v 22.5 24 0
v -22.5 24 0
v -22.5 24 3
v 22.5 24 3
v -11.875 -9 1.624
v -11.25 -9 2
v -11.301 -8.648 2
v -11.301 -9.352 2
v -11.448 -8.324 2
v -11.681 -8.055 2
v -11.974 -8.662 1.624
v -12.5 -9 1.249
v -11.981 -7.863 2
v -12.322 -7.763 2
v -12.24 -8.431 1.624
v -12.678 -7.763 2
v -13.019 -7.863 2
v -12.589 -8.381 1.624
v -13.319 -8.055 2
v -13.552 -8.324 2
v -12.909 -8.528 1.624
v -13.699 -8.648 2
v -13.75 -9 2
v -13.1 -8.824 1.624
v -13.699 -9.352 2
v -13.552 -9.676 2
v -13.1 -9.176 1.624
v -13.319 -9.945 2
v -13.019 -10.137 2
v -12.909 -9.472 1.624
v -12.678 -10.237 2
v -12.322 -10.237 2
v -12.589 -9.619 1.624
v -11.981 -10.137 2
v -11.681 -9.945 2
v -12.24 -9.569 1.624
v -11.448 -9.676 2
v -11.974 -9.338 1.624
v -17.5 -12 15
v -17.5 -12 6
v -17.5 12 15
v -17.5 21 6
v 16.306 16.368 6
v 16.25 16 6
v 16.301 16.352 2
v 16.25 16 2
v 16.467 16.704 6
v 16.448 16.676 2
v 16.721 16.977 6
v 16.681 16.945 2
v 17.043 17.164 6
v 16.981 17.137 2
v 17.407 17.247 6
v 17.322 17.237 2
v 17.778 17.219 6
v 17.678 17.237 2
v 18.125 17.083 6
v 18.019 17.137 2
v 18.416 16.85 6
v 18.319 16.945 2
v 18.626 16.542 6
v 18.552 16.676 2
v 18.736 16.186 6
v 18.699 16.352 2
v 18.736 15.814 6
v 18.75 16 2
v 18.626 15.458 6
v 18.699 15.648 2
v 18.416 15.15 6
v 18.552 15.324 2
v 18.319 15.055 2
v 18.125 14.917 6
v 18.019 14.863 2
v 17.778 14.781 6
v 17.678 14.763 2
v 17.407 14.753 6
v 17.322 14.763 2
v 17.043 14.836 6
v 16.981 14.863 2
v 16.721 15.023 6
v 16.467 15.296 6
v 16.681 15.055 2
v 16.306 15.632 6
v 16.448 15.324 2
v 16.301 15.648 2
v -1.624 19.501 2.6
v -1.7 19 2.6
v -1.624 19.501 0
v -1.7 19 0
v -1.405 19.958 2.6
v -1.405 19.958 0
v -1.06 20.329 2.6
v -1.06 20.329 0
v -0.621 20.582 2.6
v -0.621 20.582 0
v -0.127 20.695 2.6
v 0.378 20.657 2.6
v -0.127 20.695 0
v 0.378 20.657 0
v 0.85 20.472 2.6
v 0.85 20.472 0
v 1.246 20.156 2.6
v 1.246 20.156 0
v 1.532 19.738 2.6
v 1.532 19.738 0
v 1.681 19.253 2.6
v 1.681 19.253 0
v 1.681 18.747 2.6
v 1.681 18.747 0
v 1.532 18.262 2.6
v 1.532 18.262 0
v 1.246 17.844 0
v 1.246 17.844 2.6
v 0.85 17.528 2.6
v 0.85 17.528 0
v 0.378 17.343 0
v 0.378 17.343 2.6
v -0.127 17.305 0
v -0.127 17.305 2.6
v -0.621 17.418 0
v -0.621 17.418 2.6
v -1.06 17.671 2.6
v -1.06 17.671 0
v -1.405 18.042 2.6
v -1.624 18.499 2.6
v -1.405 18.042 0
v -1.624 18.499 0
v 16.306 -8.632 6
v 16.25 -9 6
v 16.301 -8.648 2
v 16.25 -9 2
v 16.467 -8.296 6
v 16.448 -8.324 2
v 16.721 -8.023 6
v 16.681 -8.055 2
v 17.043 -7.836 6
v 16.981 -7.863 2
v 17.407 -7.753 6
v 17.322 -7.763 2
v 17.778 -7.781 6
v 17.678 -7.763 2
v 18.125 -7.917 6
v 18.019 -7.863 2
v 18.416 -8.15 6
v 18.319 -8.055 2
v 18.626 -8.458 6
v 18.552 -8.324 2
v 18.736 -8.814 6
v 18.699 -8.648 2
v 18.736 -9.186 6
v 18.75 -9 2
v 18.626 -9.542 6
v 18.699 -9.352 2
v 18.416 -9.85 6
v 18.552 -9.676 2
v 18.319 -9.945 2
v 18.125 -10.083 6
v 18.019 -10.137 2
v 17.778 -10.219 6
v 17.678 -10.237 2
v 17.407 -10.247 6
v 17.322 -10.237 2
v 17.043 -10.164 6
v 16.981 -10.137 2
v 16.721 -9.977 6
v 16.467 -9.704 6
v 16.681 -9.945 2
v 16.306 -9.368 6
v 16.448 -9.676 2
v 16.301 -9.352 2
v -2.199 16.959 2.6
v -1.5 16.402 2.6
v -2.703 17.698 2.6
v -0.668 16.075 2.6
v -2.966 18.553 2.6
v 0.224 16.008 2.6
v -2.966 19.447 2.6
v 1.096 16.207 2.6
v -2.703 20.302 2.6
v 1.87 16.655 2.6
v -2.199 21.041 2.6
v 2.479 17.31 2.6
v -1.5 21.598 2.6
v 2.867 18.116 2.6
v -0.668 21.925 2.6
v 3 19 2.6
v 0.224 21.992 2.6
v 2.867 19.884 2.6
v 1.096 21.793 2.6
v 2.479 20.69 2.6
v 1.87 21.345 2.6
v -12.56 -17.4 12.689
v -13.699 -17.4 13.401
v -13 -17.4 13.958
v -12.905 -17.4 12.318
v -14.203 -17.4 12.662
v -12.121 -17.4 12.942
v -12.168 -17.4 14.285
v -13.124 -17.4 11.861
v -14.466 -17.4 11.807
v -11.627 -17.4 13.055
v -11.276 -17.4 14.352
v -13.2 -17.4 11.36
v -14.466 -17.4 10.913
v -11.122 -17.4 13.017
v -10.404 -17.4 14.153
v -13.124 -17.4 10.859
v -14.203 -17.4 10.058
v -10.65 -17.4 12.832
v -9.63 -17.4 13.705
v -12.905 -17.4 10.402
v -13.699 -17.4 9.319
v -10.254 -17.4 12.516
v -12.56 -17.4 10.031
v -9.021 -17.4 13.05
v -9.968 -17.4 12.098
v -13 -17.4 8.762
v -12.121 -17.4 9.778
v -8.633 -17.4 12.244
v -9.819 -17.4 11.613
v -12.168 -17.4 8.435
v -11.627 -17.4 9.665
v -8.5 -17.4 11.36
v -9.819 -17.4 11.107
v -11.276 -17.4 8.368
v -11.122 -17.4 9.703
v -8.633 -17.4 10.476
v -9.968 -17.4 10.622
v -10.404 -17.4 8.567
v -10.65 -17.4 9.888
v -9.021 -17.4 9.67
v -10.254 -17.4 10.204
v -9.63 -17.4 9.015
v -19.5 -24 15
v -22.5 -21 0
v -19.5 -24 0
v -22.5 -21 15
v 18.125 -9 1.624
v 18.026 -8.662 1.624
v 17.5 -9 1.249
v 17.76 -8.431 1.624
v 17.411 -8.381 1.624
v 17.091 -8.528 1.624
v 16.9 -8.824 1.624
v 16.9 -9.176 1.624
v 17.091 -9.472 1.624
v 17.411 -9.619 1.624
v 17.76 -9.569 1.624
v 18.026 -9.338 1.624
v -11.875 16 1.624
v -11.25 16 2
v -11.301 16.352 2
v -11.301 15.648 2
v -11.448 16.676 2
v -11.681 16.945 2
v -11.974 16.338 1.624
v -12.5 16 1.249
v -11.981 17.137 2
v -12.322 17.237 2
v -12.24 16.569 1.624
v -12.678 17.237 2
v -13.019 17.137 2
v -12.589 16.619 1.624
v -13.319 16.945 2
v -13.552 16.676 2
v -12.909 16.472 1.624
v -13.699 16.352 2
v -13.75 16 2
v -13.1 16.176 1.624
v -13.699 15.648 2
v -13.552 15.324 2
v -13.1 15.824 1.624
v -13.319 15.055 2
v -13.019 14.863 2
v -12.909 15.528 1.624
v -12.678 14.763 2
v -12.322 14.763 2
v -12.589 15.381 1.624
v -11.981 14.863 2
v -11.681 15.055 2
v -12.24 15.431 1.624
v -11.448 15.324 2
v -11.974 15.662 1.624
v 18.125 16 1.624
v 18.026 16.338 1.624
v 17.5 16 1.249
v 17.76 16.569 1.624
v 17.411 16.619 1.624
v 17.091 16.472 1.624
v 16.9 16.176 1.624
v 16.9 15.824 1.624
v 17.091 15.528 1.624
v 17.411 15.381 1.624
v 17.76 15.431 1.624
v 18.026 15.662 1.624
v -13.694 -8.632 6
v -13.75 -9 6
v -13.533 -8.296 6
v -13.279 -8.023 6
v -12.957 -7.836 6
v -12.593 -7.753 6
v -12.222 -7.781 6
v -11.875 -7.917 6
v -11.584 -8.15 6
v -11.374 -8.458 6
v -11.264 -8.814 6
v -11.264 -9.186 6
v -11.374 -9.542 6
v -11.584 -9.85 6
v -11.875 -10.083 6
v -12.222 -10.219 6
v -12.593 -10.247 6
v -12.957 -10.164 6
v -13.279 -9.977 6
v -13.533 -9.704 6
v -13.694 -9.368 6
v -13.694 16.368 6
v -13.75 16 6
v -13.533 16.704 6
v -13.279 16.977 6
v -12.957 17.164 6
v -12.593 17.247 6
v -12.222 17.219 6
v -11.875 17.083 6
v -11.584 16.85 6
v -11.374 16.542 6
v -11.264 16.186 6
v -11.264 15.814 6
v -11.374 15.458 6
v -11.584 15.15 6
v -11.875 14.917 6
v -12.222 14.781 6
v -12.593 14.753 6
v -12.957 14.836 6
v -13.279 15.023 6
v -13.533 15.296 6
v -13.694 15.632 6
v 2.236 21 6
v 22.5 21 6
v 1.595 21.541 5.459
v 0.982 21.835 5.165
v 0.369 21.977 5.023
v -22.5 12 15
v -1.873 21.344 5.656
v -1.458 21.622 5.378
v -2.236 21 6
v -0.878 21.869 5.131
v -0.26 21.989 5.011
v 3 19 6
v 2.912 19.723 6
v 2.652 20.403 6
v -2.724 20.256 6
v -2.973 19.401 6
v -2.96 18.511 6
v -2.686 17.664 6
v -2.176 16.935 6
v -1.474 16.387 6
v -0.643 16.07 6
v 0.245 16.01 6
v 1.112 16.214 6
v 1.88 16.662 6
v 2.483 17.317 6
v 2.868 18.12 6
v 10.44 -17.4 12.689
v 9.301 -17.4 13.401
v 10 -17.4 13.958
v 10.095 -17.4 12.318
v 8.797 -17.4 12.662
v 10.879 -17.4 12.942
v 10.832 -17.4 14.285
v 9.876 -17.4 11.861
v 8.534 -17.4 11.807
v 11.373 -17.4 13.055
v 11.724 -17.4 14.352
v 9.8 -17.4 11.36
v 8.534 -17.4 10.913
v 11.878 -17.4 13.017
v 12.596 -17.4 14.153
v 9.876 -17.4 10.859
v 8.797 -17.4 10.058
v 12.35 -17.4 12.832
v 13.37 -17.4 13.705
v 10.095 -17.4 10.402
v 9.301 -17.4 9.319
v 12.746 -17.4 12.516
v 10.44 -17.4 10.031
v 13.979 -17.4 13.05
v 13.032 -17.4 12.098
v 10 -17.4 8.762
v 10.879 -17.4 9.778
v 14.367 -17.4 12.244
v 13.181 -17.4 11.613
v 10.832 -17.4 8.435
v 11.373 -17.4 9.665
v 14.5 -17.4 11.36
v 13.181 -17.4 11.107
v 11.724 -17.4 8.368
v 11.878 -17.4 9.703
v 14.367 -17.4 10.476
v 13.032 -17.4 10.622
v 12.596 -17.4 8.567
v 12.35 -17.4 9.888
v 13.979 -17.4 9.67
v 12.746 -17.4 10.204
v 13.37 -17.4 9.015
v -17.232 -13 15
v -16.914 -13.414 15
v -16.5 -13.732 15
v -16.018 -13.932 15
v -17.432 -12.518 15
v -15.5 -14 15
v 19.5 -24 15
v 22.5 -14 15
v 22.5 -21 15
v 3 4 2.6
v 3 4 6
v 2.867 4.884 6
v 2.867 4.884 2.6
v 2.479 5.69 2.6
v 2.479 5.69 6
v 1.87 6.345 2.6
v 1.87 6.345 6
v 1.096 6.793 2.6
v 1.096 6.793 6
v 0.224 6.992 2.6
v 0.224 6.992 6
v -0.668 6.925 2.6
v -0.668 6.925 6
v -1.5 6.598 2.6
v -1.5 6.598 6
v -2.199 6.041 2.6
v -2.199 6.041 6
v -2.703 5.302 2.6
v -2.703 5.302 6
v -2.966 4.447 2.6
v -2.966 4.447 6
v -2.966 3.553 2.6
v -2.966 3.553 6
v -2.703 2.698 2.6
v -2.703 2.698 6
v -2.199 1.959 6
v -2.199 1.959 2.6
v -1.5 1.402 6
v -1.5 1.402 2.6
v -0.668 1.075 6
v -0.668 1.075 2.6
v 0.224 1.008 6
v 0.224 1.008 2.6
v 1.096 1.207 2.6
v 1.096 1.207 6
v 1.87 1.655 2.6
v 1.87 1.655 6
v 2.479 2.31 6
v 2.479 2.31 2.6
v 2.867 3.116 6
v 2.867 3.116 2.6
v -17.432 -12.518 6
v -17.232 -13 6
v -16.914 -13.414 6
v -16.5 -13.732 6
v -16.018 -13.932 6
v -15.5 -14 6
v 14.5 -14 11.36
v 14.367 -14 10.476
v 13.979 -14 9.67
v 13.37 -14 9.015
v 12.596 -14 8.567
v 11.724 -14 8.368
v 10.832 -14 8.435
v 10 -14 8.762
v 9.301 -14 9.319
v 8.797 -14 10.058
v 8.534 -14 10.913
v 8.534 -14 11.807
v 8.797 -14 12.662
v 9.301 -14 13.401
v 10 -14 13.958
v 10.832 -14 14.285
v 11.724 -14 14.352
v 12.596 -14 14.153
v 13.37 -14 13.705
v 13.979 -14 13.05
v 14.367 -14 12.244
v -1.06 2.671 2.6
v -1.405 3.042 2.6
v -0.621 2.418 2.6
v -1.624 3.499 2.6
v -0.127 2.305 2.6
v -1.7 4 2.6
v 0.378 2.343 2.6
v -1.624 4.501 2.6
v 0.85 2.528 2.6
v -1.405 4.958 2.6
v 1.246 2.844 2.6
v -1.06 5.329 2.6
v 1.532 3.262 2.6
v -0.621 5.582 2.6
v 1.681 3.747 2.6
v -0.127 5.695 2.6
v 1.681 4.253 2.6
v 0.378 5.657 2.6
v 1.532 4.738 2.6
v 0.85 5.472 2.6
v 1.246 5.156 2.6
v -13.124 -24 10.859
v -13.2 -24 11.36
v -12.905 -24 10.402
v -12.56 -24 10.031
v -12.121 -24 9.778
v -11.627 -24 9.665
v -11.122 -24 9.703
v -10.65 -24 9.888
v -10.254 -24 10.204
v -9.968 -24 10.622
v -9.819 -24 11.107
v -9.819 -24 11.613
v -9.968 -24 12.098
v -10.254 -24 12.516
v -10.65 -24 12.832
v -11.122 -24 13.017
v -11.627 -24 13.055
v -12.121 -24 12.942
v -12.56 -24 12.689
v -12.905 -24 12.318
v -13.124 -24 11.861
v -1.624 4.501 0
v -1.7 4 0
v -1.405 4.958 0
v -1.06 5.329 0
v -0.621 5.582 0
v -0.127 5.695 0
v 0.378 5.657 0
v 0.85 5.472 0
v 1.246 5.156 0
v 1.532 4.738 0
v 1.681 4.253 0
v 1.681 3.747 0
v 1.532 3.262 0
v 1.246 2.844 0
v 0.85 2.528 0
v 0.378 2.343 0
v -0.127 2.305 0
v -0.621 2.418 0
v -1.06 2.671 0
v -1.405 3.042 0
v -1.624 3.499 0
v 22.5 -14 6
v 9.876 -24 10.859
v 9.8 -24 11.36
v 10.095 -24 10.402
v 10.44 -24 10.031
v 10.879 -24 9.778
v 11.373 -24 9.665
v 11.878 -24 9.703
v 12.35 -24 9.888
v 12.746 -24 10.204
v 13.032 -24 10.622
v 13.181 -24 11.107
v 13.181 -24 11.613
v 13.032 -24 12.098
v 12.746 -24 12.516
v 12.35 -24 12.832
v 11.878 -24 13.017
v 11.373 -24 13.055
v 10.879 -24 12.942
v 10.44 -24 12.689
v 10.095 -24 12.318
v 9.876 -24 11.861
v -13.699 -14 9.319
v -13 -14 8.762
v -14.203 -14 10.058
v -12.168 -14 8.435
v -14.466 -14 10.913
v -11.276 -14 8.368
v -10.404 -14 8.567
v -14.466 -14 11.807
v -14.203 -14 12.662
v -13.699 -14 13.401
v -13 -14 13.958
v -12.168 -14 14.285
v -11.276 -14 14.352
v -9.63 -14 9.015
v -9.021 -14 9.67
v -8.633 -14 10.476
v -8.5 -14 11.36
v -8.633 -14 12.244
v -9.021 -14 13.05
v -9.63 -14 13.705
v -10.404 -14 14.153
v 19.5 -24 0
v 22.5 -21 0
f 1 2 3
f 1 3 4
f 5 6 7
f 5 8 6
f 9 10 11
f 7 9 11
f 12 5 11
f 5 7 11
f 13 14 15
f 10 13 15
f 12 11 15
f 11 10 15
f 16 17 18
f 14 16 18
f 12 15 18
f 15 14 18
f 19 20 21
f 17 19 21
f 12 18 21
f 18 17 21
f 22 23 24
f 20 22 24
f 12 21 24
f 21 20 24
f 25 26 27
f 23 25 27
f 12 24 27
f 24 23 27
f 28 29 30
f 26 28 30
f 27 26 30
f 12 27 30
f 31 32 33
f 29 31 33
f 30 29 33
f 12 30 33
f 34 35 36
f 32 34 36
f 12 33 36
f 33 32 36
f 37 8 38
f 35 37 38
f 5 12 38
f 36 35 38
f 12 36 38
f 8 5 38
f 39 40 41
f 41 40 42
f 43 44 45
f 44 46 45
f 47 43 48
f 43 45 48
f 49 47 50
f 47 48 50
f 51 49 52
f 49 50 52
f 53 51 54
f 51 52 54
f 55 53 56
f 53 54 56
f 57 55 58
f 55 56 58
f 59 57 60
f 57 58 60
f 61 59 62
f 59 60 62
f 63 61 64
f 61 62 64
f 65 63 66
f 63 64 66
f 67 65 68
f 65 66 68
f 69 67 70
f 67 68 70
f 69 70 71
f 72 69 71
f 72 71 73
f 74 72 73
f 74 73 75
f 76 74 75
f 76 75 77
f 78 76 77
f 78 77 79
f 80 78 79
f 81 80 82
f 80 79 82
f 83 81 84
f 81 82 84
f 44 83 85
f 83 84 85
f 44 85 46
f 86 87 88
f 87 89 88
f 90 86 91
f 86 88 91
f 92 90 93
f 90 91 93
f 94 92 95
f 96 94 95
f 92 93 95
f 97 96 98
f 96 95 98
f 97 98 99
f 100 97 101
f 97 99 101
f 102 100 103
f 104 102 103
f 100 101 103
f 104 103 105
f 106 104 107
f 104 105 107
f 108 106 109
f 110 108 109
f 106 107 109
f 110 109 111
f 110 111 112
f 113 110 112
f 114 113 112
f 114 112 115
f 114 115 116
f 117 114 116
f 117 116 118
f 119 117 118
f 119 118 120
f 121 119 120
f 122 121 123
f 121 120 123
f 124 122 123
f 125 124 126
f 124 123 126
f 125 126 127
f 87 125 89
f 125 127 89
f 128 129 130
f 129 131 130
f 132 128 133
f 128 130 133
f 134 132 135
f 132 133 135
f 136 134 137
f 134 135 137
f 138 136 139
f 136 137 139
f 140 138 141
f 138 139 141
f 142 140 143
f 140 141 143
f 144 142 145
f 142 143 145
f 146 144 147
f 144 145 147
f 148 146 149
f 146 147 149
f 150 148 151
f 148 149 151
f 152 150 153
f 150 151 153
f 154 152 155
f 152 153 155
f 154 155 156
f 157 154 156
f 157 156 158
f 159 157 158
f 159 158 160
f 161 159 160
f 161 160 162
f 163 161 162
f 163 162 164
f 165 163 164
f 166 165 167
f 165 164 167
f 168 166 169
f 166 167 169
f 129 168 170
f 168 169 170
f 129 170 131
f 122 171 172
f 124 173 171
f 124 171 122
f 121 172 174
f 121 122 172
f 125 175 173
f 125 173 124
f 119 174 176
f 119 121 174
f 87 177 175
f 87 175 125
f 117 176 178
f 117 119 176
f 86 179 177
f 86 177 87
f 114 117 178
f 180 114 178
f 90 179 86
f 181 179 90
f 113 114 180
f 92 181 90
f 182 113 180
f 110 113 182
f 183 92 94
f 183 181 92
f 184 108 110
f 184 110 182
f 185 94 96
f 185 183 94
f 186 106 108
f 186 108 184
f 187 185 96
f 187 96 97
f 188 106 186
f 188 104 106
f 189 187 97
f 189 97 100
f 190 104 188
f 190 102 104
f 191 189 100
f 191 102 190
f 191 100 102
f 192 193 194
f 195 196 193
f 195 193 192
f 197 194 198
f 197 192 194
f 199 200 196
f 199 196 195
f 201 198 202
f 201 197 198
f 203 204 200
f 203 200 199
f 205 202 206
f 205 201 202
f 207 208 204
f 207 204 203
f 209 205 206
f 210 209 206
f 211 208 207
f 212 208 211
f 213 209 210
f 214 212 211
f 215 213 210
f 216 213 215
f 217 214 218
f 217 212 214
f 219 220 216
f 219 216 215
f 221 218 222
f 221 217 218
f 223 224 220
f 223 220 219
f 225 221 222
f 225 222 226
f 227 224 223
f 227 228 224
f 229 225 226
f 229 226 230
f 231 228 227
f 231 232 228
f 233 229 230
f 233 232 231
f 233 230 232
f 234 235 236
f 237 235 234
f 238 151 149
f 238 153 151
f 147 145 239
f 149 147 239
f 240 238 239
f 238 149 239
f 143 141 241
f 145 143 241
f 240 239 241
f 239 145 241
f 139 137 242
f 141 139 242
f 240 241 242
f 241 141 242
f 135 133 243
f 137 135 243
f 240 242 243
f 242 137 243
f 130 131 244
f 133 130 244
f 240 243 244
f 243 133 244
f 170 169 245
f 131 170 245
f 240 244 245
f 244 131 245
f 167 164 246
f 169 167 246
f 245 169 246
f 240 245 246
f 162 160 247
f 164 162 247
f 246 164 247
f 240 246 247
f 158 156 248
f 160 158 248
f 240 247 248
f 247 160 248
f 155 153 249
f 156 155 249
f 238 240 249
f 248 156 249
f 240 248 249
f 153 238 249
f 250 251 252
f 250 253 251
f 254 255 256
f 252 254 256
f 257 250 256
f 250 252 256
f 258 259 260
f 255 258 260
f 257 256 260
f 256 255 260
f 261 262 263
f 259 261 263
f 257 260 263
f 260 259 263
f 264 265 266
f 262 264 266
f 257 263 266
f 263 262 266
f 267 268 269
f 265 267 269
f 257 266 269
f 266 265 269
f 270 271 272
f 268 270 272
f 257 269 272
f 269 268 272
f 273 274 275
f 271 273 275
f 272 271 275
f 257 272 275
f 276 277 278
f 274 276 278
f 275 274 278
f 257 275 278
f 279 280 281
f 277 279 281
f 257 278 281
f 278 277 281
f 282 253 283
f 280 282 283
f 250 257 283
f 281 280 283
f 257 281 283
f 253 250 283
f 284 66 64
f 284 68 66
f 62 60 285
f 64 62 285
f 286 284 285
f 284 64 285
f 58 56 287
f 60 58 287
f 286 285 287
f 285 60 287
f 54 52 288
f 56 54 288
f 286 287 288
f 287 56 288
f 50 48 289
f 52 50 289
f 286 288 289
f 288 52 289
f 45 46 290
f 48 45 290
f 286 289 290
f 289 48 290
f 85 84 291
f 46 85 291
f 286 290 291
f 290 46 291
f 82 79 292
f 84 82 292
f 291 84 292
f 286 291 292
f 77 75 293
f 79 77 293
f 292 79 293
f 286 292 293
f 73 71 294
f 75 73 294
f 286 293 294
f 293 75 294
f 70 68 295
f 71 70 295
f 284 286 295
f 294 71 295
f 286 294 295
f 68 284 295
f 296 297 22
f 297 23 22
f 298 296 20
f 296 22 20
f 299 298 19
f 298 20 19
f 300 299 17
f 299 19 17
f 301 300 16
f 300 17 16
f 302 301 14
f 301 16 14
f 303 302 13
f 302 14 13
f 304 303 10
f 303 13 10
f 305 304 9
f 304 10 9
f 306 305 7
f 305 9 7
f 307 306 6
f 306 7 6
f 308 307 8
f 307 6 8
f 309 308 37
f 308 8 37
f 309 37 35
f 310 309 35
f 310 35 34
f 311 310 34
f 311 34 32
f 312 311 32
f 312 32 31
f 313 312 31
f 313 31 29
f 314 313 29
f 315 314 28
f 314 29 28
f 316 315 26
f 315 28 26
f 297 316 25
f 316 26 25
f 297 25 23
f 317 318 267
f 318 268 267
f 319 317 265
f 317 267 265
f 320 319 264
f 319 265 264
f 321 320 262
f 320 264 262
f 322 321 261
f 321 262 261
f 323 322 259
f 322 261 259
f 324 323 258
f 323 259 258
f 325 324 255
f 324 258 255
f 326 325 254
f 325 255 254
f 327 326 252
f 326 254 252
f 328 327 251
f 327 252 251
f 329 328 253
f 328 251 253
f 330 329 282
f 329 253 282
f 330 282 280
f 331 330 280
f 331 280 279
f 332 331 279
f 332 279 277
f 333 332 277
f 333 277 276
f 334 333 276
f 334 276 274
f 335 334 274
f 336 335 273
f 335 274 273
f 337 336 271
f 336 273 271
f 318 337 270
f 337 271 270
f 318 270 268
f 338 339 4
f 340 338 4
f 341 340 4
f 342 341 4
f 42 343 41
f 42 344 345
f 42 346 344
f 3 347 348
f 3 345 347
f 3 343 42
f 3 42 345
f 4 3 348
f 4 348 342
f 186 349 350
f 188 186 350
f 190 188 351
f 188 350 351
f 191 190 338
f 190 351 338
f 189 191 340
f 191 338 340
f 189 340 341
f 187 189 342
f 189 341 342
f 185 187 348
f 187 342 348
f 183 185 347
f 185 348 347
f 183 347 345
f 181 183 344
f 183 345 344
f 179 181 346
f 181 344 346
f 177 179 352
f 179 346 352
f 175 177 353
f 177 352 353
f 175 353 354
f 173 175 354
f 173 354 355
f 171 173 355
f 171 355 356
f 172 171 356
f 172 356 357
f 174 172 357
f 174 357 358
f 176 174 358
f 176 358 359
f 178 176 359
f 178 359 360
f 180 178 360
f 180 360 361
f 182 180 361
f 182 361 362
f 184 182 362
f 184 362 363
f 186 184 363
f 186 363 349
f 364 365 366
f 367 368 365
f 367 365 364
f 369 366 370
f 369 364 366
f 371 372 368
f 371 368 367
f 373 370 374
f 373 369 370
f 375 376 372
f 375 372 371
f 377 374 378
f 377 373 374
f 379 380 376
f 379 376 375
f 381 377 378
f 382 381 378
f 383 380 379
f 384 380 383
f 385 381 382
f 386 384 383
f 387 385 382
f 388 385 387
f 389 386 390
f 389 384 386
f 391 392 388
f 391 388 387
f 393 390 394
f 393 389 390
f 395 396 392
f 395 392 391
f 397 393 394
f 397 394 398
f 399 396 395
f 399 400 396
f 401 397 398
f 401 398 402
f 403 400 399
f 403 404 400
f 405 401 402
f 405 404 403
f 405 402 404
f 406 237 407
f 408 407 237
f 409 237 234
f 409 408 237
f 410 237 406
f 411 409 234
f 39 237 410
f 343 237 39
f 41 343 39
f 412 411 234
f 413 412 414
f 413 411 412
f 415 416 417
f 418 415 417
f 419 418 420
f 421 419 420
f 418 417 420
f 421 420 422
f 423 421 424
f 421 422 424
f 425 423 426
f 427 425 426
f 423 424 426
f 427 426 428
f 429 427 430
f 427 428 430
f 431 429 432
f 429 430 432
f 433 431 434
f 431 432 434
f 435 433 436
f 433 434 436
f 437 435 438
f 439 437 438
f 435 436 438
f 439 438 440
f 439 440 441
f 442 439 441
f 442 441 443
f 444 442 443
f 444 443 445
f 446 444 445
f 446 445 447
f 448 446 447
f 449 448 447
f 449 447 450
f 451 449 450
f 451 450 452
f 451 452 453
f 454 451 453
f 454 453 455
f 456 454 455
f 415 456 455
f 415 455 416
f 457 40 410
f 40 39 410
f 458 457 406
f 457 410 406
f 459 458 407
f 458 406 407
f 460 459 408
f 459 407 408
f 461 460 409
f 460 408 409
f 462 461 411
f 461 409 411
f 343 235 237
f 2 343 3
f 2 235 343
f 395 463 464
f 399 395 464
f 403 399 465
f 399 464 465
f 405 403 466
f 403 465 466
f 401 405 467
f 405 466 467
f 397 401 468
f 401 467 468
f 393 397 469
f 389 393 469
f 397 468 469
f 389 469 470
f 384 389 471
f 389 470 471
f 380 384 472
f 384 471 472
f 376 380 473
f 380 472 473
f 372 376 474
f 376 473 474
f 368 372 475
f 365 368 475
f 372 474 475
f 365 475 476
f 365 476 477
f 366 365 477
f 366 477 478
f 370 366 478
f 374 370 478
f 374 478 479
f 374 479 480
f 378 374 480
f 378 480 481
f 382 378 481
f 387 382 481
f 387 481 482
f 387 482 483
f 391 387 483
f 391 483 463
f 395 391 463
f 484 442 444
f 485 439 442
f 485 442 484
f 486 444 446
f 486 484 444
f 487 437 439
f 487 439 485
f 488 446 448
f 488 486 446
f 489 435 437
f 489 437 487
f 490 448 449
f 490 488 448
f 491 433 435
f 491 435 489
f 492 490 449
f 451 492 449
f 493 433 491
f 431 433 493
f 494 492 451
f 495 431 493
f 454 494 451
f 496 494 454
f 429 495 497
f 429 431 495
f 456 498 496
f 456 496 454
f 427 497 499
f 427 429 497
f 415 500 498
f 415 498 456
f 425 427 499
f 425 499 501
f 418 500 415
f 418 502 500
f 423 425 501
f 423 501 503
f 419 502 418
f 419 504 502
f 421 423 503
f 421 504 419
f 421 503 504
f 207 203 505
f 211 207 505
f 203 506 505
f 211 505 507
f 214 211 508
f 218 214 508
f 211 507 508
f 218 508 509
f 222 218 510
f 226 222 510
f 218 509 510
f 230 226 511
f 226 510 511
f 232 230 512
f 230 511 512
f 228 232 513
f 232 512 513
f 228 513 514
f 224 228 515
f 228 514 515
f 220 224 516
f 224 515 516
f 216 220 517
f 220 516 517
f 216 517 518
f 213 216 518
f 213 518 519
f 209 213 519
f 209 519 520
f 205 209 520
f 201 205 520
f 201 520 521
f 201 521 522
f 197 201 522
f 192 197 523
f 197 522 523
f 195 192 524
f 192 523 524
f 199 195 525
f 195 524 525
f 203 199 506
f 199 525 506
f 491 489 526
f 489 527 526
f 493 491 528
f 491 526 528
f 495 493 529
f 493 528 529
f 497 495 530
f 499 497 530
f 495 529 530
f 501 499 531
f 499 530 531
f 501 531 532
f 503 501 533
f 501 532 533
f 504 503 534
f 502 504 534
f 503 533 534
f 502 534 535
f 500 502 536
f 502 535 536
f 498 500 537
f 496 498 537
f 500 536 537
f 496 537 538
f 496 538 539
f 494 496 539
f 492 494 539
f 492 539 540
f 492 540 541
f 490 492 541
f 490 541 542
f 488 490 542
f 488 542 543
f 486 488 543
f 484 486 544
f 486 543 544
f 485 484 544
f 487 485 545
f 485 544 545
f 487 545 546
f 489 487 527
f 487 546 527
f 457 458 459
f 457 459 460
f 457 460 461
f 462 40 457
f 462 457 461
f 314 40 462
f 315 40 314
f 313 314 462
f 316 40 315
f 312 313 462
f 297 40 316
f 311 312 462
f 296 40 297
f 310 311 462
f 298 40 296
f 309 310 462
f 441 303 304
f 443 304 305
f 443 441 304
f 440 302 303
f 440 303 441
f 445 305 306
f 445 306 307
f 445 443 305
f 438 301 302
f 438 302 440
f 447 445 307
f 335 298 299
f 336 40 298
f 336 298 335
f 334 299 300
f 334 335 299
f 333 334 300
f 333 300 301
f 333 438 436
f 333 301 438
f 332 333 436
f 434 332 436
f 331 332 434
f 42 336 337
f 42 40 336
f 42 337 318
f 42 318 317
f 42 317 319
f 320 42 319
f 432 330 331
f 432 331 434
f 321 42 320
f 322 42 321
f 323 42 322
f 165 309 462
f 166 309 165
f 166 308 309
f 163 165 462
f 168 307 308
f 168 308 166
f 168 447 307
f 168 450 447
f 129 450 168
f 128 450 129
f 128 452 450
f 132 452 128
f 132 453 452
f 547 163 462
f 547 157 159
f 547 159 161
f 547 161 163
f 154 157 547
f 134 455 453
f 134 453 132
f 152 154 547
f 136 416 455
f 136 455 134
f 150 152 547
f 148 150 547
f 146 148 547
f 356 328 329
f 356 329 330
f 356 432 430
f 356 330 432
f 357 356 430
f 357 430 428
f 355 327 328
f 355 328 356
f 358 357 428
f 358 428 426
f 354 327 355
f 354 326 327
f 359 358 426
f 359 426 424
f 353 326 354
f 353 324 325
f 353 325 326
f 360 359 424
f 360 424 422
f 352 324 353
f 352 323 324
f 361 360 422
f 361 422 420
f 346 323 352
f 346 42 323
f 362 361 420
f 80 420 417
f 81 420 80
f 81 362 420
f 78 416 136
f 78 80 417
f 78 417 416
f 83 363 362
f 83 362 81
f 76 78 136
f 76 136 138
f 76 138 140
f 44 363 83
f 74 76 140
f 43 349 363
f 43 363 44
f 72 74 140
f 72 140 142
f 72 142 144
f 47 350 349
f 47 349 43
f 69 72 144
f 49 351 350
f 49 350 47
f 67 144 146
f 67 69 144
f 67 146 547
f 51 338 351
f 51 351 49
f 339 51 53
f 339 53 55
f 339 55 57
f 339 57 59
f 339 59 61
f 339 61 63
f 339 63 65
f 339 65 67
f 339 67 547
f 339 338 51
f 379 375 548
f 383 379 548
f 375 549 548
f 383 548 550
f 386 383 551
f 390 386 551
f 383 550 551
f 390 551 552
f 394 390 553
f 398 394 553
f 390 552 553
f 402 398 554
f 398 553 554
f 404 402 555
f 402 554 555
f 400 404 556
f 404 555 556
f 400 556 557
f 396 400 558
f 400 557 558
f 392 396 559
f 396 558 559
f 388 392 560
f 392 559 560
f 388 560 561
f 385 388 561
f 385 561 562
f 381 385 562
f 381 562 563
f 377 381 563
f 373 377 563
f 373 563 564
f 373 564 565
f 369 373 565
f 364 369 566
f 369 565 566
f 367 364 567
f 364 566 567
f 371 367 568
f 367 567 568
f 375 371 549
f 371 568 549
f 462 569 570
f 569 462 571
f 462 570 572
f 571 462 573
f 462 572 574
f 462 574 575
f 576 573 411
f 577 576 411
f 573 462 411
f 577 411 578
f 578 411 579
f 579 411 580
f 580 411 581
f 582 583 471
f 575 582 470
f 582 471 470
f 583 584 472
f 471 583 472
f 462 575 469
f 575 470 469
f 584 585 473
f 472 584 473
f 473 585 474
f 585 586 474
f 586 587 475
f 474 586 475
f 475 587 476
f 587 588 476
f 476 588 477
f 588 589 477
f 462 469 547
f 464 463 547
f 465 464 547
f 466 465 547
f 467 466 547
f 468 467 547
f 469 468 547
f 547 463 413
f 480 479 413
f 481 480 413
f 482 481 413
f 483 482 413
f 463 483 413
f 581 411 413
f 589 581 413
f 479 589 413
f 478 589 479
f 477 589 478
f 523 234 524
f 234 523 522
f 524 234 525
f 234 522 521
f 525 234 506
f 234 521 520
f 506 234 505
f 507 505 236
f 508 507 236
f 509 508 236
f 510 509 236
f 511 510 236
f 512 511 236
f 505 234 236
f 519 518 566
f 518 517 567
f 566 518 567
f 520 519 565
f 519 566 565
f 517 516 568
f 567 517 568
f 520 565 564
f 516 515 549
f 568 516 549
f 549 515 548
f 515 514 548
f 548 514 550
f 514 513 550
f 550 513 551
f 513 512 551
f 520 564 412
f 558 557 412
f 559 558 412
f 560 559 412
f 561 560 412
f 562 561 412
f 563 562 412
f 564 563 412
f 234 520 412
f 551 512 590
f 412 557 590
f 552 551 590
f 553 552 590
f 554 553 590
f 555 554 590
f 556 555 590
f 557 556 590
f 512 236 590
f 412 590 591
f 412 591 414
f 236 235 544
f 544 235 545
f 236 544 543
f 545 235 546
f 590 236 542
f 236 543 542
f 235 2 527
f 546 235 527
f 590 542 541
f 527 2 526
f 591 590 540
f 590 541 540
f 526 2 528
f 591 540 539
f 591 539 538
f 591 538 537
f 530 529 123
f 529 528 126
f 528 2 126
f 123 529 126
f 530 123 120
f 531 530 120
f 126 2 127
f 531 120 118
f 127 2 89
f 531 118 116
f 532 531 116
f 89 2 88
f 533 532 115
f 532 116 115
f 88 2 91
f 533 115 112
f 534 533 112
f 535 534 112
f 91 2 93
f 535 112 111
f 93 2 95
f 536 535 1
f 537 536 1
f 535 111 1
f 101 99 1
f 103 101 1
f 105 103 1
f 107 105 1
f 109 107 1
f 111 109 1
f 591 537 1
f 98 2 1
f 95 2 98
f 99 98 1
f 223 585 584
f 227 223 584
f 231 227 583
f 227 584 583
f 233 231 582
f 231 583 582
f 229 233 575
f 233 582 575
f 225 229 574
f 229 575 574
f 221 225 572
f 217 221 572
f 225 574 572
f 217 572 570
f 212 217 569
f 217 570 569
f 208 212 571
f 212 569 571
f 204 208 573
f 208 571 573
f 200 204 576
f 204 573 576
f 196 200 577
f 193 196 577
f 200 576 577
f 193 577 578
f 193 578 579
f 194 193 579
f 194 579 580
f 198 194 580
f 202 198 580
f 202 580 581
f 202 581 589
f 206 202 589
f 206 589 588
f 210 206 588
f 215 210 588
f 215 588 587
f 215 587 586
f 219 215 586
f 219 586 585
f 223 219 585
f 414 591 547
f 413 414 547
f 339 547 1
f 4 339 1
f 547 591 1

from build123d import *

# Parameters (mm, degrees)
SKETCH1_W                                            = 45
SKETCH1_H                                            = 48
BOSS_EXTRUDE1_DEPTH                                  = 6
SKETCH2_W                                            = 45
SKETCH2_H                                            = 15
BOSS_EXTRUDE2_DEPTH                                  = 10
CBORE_FOR_M3_HEXAGON_SOCKET_HEAD_CAP_SCR_D           = 3.4
CBORE_FOR_M3_HEXAGON_SOCKET_HEAD_CAP_SCR_DEPTH       = 15
CBORE_FOR_M3_HEXAGON_SOCKET_HEAD_CAP_SCR_CBORE_D     = 6
CBORE_FOR_M3_HEXAGON_SOCKET_HEAD_CAP_SCR_CBORE_DEPTH = 3.4
CBORE_FOR_M3_HEXAGON_SOCKET_HEAD_CAP_SCR_TIP         = 1.021463052
SKETCH6_W                                            = 5
SKETCH6_H                                            = 38
BOSS_EXTRUDE3_DEPTH                                  = 9
FILLET1_R                                            = 2
CBORE_FOR_M3_HEXAGON_SOCKET_HEAD_CAP_2_D             = 3.4
CBORE_FOR_M3_HEXAGON_SOCKET_HEAD_CAP_2_CBORE_D       = 6
CBORE_FOR_M3_HEXAGON_SOCKET_HEAD_CAP_2_CBORE_DEPTH   = 3.4
CHAMFER3_SIZE                                        = 3
CUT_EXTRUDE1_DEPTH                                   = 54.16013544
CUT_EXTRUDE1_DEPTH_BACK                              = 54.16013544
M3_TAPPED_HOLE1_D                                    = 2.5
M3_TAPPED_HOLE1_DEPTH                                = 4
M3_TAPPED_HOLE1_TIP                                  = 0.751075774


with BuildPart() as part:
    # Sketch1 → Boss-Extrude1 (new body)
    with BuildSketch(Plane.XY):
        Rectangle(SKETCH1_W, SKETCH1_H)
    extrude(amount=BOSS_EXTRUDE1_DEPTH)

    # Sketch2 → Boss-Extrude2 (add)
    with BuildSketch(Plane.XZ.offset(24)):
        with Locations((0, 7.5)):
            Rectangle(SKETCH2_W, SKETCH2_H)
    extrude(amount=-BOSS_EXTRUDE2_DEPTH)

    # CBORE for M3 Hexagon socket head cap scr
    with Locations(Plane(origin=(0, -14, 0), x_dir=(1, 0, 0), z_dir=(0, 1, 0))):
        with Locations((-11.5, -11.36), (11.5, -11.36)):
            CounterBoreHole(CBORE_FOR_M3_HEXAGON_SOCKET_HEAD_CAP_SCR_D / 2, CBORE_FOR_M3_HEXAGON_SOCKET_HEAD_CAP_SCR_CBORE_D / 2, CBORE_FOR_M3_HEXAGON_SOCKET_HEAD_CAP_SCR_CBORE_DEPTH, depth=CBORE_FOR_M3_HEXAGON_SOCKET_HEAD_CAP_SCR_DEPTH)
            with Locations((0, 0, -(CBORE_FOR_M3_HEXAGON_SOCKET_HEAD_CAP_SCR_DEPTH + CBORE_FOR_M3_HEXAGON_SOCKET_HEAD_CAP_SCR_TIP / 2))):  # 118° drill point
                Cone(0, CBORE_FOR_M3_HEXAGON_SOCKET_HEAD_CAP_SCR_D / 2, CBORE_FOR_M3_HEXAGON_SOCKET_HEAD_CAP_SCR_TIP, mode=Mode.SUBTRACT)

    # Sketch6 → Boss-Extrude3 (add)
    with BuildSketch(Plane.XY.offset(6)):
        with Locations((-20, 5)):
            Rectangle(SKETCH6_W, SKETCH6_H)
    extrude(amount=BOSS_EXTRUDE3_DEPTH)

    # Fillet1
    fillet1_edges = [part.edges().sort_by_distance(p)[0] for p in [
        (-17.5, -14, 10.5),
    ]]
    fillet(fillet1_edges, radius=FILLET1_R)

    # CBORE for M3 Hexagon socket head cap 2 (through all)
    with Locations(Plane.XY.offset(6)):
        with Locations((0, 19), (0, 4)):
            CounterBoreHole(CBORE_FOR_M3_HEXAGON_SOCKET_HEAD_CAP_2_D / 2, CBORE_FOR_M3_HEXAGON_SOCKET_HEAD_CAP_2_CBORE_D / 2, CBORE_FOR_M3_HEXAGON_SOCKET_HEAD_CAP_2_CBORE_DEPTH)

    # Chamfer3
    chamfer3_edges = [part.edges().sort_by_distance(p)[0] for p in [
        (22.5, -24, 7.5),
        (-22.5, -24, 7.5),
    ]]
    chamfer(chamfer3_edges, length=CHAMFER3_SIZE)

    # Sketch9 → Cut-Extrude1 (cut, two sides: drawn at the far end of the back side and taken through both)
    with BuildSketch(Plane(origin=(22.5, 0, 0), x_dir=(0, 0, -1), z_dir=(1, 0, 0)).offset(-CUT_EXTRUDE1_DEPTH_BACK)):
        Polygon((74.04249055, 101.04249055), (-3, 24), (-15, 12), (-92.04249055, -65.04249055), (-246.12747165, 89.04249055), (-80.04249055, 255.12747165), align=None)
    extrude(amount=CUT_EXTRUDE1_DEPTH + CUT_EXTRUDE1_DEPTH_BACK, mode=Mode.SUBTRACT)

    # M3 Tapped Hole1
    with Locations(Plane.XY.offset(6)):
        with Locations((-12.5, 16), (17.5, 16), (-12.5, -9), (17.5, -9)):
            Hole(M3_TAPPED_HOLE1_D / 2, depth=M3_TAPPED_HOLE1_DEPTH)
            with Locations((0, 0, -(M3_TAPPED_HOLE1_DEPTH + M3_TAPPED_HOLE1_TIP / 2))):  # 118° drill point
                Cone(0, M3_TAPPED_HOLE1_D / 2, M3_TAPPED_HOLE1_TIP, mode=Mode.SUBTRACT)


solid = part.part
